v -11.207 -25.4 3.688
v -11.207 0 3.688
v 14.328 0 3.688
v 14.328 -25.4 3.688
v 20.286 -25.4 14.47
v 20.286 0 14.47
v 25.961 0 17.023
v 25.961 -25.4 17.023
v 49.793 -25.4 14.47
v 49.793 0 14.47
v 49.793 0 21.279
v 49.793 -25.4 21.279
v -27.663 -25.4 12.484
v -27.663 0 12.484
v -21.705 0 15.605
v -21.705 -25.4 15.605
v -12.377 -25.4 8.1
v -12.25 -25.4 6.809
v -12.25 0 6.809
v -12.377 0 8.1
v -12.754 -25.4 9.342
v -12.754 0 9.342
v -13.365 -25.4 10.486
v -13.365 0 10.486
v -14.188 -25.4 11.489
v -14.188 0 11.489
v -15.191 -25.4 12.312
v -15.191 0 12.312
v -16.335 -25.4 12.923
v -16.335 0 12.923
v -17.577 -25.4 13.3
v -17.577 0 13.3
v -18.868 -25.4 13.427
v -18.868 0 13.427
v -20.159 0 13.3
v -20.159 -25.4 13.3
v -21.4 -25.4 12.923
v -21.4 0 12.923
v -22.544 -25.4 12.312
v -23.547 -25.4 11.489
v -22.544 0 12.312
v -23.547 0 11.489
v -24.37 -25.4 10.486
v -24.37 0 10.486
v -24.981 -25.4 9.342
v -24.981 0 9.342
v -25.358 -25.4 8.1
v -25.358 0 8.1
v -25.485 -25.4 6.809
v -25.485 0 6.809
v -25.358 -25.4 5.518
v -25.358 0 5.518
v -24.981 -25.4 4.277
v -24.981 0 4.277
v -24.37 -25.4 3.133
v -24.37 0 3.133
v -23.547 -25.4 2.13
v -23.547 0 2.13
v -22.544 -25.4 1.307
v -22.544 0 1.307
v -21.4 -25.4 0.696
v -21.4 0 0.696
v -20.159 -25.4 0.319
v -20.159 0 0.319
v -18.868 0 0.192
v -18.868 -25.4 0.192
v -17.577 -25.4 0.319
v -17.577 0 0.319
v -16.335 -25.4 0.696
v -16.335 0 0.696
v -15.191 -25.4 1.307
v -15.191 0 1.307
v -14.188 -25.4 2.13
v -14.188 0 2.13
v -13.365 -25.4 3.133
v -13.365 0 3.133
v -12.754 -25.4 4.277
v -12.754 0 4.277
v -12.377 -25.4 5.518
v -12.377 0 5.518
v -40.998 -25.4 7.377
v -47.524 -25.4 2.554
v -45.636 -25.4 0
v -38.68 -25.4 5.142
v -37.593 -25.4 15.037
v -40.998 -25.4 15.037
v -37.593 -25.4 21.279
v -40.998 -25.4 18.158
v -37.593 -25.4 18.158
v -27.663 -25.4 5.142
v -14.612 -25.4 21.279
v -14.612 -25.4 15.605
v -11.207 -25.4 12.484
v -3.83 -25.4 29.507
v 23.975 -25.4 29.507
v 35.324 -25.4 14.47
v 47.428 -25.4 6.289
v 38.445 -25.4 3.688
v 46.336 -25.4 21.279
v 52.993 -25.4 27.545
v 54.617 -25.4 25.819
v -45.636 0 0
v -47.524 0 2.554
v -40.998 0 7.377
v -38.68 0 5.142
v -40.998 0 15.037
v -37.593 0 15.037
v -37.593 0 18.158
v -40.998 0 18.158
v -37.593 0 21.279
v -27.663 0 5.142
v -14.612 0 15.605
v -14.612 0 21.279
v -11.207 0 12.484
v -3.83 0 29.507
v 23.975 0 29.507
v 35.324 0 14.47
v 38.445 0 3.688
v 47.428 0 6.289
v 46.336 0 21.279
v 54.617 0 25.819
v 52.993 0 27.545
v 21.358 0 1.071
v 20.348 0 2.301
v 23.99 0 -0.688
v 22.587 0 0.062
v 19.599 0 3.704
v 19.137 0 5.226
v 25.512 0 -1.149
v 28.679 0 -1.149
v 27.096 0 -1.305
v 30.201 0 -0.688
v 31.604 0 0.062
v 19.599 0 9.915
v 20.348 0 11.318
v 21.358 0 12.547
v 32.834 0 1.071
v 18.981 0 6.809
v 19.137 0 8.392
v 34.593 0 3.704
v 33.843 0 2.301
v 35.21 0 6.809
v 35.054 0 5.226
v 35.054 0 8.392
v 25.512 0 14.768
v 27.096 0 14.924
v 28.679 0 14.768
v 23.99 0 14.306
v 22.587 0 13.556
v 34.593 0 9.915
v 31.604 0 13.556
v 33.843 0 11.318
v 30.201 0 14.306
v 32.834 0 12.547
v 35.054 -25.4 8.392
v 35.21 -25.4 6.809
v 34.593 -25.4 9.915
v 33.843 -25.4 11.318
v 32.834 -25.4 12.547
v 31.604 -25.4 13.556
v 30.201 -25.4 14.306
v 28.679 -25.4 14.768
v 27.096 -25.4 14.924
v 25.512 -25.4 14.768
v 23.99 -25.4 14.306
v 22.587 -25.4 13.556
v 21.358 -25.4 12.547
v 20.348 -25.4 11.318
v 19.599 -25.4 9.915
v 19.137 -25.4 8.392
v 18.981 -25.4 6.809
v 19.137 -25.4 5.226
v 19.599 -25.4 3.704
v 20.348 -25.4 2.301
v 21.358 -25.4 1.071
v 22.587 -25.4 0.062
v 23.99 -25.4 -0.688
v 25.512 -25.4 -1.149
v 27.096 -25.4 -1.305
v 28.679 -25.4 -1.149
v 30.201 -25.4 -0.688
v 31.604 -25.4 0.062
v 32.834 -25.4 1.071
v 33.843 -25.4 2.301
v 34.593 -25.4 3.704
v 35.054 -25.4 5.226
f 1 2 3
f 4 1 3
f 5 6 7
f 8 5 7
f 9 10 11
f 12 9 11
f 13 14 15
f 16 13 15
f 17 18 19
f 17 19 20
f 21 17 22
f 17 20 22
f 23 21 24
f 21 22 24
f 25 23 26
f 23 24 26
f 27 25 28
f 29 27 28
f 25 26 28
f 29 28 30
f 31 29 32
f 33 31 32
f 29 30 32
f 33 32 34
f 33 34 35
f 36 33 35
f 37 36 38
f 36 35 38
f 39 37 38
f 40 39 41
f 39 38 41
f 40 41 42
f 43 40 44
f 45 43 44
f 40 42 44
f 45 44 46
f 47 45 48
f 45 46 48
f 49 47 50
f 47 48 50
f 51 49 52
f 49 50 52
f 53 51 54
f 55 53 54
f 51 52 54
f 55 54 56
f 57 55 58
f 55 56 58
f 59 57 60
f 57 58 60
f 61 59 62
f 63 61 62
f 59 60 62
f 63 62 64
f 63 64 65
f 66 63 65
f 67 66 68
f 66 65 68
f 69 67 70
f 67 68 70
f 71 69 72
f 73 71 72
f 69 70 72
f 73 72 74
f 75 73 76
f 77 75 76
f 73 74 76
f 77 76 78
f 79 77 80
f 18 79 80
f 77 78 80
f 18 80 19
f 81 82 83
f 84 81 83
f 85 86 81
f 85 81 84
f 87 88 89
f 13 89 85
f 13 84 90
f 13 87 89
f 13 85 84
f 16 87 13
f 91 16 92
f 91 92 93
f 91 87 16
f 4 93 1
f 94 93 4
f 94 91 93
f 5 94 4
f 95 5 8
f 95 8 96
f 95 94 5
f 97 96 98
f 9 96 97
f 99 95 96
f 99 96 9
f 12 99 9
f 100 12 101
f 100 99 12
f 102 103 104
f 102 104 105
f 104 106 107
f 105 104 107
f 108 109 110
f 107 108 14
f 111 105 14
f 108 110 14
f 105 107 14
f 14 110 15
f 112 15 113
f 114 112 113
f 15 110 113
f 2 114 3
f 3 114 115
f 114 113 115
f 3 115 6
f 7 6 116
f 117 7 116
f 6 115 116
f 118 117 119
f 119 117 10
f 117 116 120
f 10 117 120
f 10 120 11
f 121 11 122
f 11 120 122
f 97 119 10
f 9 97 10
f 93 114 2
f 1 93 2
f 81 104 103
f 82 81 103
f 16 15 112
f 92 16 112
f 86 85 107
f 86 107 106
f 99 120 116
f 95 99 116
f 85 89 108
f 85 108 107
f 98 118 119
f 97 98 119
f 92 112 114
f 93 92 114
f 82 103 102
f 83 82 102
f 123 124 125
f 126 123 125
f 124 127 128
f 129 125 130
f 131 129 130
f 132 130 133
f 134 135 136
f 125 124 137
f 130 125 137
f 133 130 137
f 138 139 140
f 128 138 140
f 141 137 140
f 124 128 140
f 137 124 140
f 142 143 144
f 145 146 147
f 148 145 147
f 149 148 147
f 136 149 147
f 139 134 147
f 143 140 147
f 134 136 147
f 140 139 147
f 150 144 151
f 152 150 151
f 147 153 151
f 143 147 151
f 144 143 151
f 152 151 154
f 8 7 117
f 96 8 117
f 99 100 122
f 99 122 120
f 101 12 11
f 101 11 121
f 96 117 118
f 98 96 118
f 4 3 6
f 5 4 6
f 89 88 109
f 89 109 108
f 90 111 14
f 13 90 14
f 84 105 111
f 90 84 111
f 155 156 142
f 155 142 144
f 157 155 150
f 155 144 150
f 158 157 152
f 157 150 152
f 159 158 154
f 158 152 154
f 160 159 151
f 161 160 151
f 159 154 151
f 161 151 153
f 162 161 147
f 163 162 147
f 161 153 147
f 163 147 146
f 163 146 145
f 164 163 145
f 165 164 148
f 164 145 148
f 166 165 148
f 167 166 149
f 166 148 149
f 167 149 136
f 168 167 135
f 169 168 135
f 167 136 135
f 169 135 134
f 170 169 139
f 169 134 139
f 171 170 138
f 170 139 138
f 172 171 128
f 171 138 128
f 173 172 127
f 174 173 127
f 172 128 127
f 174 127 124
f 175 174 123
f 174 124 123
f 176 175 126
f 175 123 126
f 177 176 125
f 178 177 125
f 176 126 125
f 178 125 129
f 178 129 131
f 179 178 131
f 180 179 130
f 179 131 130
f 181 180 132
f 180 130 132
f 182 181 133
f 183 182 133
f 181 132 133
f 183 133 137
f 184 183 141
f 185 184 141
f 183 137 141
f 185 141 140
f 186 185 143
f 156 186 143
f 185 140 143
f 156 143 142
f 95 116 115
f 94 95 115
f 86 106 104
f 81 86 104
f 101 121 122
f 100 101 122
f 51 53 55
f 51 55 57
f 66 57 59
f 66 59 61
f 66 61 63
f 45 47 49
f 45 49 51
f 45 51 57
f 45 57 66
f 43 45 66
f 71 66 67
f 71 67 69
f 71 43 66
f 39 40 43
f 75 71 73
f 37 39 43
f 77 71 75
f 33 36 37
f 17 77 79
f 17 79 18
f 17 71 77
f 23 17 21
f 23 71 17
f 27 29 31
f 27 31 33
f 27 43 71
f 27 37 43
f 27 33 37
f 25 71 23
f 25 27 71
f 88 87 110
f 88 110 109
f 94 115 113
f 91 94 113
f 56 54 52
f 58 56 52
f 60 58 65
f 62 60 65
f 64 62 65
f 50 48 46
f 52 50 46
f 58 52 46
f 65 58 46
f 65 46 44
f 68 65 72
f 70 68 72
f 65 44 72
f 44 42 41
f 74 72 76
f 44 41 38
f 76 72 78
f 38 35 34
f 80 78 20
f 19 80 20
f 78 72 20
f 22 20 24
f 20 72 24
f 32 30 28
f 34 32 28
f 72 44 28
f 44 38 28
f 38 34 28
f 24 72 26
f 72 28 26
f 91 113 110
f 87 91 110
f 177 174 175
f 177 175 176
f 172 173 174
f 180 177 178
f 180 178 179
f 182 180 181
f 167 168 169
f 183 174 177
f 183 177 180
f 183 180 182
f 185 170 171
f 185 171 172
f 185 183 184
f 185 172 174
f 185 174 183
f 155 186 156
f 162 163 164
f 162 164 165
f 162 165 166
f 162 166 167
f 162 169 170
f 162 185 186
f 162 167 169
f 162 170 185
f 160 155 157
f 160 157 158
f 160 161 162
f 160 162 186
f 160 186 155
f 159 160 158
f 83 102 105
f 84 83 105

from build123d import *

# Parameters (mm, degrees)
F0_R     = 8.114688
F0_R_2   = 6.617511
F1_DEPTH = 25.4
F3_DEPTH = 25.4


with BuildPart() as f1:
    # F0 (on Front) → F1 (new body)
    with BuildSketch(Plane.XZ):
        with Locations((27.095586, 6.809362)):
            Circle(F0_R)
        with Locations((-18.867606, 6.809362)):
            Circle(F0_R_2)
    extrude(amount=F1_DEPTH)


with BuildPart() as f3:
    # F2 (on Front) → F3 (new body)
    with BuildSketch(Plane.XZ):
        Polygon((-11.207075, 12.483831), (-11.207075, 3.688404), (14.328031, 3.688404), (20.286225, 14.469894), (25.960695, 17.023405), (35.323564, 14.469894), (38.444523, 3.688404), (47.42795, 6.288871), (49.793456, 14.469894), (49.793456, 21.279255), (54.616753, 25.81883), (52.992502, 27.544596), (46.335579, 21.279255), (23.974625, 29.507235), (-3.830265, 29.507235), (-14.611755, 21.279255), (-37.59335, 21.279255), (-40.998034, 18.158298), (-37.59335, 18.158298), (-37.59335, 15.037341), (-40.998034, 15.037341), (-40.998034, 7.376809), (-47.52367, 2.553511), (-45.636292, 0), (-38.679868, 5.141706), (-27.663032, 5.141706), (-27.663032, 12.483831), (-21.704841, 15.604788), (-14.611755, 15.604788), align=None)
    extrude(amount=F3_DEPTH)


solid = Compound([f1.part, f3.part])
